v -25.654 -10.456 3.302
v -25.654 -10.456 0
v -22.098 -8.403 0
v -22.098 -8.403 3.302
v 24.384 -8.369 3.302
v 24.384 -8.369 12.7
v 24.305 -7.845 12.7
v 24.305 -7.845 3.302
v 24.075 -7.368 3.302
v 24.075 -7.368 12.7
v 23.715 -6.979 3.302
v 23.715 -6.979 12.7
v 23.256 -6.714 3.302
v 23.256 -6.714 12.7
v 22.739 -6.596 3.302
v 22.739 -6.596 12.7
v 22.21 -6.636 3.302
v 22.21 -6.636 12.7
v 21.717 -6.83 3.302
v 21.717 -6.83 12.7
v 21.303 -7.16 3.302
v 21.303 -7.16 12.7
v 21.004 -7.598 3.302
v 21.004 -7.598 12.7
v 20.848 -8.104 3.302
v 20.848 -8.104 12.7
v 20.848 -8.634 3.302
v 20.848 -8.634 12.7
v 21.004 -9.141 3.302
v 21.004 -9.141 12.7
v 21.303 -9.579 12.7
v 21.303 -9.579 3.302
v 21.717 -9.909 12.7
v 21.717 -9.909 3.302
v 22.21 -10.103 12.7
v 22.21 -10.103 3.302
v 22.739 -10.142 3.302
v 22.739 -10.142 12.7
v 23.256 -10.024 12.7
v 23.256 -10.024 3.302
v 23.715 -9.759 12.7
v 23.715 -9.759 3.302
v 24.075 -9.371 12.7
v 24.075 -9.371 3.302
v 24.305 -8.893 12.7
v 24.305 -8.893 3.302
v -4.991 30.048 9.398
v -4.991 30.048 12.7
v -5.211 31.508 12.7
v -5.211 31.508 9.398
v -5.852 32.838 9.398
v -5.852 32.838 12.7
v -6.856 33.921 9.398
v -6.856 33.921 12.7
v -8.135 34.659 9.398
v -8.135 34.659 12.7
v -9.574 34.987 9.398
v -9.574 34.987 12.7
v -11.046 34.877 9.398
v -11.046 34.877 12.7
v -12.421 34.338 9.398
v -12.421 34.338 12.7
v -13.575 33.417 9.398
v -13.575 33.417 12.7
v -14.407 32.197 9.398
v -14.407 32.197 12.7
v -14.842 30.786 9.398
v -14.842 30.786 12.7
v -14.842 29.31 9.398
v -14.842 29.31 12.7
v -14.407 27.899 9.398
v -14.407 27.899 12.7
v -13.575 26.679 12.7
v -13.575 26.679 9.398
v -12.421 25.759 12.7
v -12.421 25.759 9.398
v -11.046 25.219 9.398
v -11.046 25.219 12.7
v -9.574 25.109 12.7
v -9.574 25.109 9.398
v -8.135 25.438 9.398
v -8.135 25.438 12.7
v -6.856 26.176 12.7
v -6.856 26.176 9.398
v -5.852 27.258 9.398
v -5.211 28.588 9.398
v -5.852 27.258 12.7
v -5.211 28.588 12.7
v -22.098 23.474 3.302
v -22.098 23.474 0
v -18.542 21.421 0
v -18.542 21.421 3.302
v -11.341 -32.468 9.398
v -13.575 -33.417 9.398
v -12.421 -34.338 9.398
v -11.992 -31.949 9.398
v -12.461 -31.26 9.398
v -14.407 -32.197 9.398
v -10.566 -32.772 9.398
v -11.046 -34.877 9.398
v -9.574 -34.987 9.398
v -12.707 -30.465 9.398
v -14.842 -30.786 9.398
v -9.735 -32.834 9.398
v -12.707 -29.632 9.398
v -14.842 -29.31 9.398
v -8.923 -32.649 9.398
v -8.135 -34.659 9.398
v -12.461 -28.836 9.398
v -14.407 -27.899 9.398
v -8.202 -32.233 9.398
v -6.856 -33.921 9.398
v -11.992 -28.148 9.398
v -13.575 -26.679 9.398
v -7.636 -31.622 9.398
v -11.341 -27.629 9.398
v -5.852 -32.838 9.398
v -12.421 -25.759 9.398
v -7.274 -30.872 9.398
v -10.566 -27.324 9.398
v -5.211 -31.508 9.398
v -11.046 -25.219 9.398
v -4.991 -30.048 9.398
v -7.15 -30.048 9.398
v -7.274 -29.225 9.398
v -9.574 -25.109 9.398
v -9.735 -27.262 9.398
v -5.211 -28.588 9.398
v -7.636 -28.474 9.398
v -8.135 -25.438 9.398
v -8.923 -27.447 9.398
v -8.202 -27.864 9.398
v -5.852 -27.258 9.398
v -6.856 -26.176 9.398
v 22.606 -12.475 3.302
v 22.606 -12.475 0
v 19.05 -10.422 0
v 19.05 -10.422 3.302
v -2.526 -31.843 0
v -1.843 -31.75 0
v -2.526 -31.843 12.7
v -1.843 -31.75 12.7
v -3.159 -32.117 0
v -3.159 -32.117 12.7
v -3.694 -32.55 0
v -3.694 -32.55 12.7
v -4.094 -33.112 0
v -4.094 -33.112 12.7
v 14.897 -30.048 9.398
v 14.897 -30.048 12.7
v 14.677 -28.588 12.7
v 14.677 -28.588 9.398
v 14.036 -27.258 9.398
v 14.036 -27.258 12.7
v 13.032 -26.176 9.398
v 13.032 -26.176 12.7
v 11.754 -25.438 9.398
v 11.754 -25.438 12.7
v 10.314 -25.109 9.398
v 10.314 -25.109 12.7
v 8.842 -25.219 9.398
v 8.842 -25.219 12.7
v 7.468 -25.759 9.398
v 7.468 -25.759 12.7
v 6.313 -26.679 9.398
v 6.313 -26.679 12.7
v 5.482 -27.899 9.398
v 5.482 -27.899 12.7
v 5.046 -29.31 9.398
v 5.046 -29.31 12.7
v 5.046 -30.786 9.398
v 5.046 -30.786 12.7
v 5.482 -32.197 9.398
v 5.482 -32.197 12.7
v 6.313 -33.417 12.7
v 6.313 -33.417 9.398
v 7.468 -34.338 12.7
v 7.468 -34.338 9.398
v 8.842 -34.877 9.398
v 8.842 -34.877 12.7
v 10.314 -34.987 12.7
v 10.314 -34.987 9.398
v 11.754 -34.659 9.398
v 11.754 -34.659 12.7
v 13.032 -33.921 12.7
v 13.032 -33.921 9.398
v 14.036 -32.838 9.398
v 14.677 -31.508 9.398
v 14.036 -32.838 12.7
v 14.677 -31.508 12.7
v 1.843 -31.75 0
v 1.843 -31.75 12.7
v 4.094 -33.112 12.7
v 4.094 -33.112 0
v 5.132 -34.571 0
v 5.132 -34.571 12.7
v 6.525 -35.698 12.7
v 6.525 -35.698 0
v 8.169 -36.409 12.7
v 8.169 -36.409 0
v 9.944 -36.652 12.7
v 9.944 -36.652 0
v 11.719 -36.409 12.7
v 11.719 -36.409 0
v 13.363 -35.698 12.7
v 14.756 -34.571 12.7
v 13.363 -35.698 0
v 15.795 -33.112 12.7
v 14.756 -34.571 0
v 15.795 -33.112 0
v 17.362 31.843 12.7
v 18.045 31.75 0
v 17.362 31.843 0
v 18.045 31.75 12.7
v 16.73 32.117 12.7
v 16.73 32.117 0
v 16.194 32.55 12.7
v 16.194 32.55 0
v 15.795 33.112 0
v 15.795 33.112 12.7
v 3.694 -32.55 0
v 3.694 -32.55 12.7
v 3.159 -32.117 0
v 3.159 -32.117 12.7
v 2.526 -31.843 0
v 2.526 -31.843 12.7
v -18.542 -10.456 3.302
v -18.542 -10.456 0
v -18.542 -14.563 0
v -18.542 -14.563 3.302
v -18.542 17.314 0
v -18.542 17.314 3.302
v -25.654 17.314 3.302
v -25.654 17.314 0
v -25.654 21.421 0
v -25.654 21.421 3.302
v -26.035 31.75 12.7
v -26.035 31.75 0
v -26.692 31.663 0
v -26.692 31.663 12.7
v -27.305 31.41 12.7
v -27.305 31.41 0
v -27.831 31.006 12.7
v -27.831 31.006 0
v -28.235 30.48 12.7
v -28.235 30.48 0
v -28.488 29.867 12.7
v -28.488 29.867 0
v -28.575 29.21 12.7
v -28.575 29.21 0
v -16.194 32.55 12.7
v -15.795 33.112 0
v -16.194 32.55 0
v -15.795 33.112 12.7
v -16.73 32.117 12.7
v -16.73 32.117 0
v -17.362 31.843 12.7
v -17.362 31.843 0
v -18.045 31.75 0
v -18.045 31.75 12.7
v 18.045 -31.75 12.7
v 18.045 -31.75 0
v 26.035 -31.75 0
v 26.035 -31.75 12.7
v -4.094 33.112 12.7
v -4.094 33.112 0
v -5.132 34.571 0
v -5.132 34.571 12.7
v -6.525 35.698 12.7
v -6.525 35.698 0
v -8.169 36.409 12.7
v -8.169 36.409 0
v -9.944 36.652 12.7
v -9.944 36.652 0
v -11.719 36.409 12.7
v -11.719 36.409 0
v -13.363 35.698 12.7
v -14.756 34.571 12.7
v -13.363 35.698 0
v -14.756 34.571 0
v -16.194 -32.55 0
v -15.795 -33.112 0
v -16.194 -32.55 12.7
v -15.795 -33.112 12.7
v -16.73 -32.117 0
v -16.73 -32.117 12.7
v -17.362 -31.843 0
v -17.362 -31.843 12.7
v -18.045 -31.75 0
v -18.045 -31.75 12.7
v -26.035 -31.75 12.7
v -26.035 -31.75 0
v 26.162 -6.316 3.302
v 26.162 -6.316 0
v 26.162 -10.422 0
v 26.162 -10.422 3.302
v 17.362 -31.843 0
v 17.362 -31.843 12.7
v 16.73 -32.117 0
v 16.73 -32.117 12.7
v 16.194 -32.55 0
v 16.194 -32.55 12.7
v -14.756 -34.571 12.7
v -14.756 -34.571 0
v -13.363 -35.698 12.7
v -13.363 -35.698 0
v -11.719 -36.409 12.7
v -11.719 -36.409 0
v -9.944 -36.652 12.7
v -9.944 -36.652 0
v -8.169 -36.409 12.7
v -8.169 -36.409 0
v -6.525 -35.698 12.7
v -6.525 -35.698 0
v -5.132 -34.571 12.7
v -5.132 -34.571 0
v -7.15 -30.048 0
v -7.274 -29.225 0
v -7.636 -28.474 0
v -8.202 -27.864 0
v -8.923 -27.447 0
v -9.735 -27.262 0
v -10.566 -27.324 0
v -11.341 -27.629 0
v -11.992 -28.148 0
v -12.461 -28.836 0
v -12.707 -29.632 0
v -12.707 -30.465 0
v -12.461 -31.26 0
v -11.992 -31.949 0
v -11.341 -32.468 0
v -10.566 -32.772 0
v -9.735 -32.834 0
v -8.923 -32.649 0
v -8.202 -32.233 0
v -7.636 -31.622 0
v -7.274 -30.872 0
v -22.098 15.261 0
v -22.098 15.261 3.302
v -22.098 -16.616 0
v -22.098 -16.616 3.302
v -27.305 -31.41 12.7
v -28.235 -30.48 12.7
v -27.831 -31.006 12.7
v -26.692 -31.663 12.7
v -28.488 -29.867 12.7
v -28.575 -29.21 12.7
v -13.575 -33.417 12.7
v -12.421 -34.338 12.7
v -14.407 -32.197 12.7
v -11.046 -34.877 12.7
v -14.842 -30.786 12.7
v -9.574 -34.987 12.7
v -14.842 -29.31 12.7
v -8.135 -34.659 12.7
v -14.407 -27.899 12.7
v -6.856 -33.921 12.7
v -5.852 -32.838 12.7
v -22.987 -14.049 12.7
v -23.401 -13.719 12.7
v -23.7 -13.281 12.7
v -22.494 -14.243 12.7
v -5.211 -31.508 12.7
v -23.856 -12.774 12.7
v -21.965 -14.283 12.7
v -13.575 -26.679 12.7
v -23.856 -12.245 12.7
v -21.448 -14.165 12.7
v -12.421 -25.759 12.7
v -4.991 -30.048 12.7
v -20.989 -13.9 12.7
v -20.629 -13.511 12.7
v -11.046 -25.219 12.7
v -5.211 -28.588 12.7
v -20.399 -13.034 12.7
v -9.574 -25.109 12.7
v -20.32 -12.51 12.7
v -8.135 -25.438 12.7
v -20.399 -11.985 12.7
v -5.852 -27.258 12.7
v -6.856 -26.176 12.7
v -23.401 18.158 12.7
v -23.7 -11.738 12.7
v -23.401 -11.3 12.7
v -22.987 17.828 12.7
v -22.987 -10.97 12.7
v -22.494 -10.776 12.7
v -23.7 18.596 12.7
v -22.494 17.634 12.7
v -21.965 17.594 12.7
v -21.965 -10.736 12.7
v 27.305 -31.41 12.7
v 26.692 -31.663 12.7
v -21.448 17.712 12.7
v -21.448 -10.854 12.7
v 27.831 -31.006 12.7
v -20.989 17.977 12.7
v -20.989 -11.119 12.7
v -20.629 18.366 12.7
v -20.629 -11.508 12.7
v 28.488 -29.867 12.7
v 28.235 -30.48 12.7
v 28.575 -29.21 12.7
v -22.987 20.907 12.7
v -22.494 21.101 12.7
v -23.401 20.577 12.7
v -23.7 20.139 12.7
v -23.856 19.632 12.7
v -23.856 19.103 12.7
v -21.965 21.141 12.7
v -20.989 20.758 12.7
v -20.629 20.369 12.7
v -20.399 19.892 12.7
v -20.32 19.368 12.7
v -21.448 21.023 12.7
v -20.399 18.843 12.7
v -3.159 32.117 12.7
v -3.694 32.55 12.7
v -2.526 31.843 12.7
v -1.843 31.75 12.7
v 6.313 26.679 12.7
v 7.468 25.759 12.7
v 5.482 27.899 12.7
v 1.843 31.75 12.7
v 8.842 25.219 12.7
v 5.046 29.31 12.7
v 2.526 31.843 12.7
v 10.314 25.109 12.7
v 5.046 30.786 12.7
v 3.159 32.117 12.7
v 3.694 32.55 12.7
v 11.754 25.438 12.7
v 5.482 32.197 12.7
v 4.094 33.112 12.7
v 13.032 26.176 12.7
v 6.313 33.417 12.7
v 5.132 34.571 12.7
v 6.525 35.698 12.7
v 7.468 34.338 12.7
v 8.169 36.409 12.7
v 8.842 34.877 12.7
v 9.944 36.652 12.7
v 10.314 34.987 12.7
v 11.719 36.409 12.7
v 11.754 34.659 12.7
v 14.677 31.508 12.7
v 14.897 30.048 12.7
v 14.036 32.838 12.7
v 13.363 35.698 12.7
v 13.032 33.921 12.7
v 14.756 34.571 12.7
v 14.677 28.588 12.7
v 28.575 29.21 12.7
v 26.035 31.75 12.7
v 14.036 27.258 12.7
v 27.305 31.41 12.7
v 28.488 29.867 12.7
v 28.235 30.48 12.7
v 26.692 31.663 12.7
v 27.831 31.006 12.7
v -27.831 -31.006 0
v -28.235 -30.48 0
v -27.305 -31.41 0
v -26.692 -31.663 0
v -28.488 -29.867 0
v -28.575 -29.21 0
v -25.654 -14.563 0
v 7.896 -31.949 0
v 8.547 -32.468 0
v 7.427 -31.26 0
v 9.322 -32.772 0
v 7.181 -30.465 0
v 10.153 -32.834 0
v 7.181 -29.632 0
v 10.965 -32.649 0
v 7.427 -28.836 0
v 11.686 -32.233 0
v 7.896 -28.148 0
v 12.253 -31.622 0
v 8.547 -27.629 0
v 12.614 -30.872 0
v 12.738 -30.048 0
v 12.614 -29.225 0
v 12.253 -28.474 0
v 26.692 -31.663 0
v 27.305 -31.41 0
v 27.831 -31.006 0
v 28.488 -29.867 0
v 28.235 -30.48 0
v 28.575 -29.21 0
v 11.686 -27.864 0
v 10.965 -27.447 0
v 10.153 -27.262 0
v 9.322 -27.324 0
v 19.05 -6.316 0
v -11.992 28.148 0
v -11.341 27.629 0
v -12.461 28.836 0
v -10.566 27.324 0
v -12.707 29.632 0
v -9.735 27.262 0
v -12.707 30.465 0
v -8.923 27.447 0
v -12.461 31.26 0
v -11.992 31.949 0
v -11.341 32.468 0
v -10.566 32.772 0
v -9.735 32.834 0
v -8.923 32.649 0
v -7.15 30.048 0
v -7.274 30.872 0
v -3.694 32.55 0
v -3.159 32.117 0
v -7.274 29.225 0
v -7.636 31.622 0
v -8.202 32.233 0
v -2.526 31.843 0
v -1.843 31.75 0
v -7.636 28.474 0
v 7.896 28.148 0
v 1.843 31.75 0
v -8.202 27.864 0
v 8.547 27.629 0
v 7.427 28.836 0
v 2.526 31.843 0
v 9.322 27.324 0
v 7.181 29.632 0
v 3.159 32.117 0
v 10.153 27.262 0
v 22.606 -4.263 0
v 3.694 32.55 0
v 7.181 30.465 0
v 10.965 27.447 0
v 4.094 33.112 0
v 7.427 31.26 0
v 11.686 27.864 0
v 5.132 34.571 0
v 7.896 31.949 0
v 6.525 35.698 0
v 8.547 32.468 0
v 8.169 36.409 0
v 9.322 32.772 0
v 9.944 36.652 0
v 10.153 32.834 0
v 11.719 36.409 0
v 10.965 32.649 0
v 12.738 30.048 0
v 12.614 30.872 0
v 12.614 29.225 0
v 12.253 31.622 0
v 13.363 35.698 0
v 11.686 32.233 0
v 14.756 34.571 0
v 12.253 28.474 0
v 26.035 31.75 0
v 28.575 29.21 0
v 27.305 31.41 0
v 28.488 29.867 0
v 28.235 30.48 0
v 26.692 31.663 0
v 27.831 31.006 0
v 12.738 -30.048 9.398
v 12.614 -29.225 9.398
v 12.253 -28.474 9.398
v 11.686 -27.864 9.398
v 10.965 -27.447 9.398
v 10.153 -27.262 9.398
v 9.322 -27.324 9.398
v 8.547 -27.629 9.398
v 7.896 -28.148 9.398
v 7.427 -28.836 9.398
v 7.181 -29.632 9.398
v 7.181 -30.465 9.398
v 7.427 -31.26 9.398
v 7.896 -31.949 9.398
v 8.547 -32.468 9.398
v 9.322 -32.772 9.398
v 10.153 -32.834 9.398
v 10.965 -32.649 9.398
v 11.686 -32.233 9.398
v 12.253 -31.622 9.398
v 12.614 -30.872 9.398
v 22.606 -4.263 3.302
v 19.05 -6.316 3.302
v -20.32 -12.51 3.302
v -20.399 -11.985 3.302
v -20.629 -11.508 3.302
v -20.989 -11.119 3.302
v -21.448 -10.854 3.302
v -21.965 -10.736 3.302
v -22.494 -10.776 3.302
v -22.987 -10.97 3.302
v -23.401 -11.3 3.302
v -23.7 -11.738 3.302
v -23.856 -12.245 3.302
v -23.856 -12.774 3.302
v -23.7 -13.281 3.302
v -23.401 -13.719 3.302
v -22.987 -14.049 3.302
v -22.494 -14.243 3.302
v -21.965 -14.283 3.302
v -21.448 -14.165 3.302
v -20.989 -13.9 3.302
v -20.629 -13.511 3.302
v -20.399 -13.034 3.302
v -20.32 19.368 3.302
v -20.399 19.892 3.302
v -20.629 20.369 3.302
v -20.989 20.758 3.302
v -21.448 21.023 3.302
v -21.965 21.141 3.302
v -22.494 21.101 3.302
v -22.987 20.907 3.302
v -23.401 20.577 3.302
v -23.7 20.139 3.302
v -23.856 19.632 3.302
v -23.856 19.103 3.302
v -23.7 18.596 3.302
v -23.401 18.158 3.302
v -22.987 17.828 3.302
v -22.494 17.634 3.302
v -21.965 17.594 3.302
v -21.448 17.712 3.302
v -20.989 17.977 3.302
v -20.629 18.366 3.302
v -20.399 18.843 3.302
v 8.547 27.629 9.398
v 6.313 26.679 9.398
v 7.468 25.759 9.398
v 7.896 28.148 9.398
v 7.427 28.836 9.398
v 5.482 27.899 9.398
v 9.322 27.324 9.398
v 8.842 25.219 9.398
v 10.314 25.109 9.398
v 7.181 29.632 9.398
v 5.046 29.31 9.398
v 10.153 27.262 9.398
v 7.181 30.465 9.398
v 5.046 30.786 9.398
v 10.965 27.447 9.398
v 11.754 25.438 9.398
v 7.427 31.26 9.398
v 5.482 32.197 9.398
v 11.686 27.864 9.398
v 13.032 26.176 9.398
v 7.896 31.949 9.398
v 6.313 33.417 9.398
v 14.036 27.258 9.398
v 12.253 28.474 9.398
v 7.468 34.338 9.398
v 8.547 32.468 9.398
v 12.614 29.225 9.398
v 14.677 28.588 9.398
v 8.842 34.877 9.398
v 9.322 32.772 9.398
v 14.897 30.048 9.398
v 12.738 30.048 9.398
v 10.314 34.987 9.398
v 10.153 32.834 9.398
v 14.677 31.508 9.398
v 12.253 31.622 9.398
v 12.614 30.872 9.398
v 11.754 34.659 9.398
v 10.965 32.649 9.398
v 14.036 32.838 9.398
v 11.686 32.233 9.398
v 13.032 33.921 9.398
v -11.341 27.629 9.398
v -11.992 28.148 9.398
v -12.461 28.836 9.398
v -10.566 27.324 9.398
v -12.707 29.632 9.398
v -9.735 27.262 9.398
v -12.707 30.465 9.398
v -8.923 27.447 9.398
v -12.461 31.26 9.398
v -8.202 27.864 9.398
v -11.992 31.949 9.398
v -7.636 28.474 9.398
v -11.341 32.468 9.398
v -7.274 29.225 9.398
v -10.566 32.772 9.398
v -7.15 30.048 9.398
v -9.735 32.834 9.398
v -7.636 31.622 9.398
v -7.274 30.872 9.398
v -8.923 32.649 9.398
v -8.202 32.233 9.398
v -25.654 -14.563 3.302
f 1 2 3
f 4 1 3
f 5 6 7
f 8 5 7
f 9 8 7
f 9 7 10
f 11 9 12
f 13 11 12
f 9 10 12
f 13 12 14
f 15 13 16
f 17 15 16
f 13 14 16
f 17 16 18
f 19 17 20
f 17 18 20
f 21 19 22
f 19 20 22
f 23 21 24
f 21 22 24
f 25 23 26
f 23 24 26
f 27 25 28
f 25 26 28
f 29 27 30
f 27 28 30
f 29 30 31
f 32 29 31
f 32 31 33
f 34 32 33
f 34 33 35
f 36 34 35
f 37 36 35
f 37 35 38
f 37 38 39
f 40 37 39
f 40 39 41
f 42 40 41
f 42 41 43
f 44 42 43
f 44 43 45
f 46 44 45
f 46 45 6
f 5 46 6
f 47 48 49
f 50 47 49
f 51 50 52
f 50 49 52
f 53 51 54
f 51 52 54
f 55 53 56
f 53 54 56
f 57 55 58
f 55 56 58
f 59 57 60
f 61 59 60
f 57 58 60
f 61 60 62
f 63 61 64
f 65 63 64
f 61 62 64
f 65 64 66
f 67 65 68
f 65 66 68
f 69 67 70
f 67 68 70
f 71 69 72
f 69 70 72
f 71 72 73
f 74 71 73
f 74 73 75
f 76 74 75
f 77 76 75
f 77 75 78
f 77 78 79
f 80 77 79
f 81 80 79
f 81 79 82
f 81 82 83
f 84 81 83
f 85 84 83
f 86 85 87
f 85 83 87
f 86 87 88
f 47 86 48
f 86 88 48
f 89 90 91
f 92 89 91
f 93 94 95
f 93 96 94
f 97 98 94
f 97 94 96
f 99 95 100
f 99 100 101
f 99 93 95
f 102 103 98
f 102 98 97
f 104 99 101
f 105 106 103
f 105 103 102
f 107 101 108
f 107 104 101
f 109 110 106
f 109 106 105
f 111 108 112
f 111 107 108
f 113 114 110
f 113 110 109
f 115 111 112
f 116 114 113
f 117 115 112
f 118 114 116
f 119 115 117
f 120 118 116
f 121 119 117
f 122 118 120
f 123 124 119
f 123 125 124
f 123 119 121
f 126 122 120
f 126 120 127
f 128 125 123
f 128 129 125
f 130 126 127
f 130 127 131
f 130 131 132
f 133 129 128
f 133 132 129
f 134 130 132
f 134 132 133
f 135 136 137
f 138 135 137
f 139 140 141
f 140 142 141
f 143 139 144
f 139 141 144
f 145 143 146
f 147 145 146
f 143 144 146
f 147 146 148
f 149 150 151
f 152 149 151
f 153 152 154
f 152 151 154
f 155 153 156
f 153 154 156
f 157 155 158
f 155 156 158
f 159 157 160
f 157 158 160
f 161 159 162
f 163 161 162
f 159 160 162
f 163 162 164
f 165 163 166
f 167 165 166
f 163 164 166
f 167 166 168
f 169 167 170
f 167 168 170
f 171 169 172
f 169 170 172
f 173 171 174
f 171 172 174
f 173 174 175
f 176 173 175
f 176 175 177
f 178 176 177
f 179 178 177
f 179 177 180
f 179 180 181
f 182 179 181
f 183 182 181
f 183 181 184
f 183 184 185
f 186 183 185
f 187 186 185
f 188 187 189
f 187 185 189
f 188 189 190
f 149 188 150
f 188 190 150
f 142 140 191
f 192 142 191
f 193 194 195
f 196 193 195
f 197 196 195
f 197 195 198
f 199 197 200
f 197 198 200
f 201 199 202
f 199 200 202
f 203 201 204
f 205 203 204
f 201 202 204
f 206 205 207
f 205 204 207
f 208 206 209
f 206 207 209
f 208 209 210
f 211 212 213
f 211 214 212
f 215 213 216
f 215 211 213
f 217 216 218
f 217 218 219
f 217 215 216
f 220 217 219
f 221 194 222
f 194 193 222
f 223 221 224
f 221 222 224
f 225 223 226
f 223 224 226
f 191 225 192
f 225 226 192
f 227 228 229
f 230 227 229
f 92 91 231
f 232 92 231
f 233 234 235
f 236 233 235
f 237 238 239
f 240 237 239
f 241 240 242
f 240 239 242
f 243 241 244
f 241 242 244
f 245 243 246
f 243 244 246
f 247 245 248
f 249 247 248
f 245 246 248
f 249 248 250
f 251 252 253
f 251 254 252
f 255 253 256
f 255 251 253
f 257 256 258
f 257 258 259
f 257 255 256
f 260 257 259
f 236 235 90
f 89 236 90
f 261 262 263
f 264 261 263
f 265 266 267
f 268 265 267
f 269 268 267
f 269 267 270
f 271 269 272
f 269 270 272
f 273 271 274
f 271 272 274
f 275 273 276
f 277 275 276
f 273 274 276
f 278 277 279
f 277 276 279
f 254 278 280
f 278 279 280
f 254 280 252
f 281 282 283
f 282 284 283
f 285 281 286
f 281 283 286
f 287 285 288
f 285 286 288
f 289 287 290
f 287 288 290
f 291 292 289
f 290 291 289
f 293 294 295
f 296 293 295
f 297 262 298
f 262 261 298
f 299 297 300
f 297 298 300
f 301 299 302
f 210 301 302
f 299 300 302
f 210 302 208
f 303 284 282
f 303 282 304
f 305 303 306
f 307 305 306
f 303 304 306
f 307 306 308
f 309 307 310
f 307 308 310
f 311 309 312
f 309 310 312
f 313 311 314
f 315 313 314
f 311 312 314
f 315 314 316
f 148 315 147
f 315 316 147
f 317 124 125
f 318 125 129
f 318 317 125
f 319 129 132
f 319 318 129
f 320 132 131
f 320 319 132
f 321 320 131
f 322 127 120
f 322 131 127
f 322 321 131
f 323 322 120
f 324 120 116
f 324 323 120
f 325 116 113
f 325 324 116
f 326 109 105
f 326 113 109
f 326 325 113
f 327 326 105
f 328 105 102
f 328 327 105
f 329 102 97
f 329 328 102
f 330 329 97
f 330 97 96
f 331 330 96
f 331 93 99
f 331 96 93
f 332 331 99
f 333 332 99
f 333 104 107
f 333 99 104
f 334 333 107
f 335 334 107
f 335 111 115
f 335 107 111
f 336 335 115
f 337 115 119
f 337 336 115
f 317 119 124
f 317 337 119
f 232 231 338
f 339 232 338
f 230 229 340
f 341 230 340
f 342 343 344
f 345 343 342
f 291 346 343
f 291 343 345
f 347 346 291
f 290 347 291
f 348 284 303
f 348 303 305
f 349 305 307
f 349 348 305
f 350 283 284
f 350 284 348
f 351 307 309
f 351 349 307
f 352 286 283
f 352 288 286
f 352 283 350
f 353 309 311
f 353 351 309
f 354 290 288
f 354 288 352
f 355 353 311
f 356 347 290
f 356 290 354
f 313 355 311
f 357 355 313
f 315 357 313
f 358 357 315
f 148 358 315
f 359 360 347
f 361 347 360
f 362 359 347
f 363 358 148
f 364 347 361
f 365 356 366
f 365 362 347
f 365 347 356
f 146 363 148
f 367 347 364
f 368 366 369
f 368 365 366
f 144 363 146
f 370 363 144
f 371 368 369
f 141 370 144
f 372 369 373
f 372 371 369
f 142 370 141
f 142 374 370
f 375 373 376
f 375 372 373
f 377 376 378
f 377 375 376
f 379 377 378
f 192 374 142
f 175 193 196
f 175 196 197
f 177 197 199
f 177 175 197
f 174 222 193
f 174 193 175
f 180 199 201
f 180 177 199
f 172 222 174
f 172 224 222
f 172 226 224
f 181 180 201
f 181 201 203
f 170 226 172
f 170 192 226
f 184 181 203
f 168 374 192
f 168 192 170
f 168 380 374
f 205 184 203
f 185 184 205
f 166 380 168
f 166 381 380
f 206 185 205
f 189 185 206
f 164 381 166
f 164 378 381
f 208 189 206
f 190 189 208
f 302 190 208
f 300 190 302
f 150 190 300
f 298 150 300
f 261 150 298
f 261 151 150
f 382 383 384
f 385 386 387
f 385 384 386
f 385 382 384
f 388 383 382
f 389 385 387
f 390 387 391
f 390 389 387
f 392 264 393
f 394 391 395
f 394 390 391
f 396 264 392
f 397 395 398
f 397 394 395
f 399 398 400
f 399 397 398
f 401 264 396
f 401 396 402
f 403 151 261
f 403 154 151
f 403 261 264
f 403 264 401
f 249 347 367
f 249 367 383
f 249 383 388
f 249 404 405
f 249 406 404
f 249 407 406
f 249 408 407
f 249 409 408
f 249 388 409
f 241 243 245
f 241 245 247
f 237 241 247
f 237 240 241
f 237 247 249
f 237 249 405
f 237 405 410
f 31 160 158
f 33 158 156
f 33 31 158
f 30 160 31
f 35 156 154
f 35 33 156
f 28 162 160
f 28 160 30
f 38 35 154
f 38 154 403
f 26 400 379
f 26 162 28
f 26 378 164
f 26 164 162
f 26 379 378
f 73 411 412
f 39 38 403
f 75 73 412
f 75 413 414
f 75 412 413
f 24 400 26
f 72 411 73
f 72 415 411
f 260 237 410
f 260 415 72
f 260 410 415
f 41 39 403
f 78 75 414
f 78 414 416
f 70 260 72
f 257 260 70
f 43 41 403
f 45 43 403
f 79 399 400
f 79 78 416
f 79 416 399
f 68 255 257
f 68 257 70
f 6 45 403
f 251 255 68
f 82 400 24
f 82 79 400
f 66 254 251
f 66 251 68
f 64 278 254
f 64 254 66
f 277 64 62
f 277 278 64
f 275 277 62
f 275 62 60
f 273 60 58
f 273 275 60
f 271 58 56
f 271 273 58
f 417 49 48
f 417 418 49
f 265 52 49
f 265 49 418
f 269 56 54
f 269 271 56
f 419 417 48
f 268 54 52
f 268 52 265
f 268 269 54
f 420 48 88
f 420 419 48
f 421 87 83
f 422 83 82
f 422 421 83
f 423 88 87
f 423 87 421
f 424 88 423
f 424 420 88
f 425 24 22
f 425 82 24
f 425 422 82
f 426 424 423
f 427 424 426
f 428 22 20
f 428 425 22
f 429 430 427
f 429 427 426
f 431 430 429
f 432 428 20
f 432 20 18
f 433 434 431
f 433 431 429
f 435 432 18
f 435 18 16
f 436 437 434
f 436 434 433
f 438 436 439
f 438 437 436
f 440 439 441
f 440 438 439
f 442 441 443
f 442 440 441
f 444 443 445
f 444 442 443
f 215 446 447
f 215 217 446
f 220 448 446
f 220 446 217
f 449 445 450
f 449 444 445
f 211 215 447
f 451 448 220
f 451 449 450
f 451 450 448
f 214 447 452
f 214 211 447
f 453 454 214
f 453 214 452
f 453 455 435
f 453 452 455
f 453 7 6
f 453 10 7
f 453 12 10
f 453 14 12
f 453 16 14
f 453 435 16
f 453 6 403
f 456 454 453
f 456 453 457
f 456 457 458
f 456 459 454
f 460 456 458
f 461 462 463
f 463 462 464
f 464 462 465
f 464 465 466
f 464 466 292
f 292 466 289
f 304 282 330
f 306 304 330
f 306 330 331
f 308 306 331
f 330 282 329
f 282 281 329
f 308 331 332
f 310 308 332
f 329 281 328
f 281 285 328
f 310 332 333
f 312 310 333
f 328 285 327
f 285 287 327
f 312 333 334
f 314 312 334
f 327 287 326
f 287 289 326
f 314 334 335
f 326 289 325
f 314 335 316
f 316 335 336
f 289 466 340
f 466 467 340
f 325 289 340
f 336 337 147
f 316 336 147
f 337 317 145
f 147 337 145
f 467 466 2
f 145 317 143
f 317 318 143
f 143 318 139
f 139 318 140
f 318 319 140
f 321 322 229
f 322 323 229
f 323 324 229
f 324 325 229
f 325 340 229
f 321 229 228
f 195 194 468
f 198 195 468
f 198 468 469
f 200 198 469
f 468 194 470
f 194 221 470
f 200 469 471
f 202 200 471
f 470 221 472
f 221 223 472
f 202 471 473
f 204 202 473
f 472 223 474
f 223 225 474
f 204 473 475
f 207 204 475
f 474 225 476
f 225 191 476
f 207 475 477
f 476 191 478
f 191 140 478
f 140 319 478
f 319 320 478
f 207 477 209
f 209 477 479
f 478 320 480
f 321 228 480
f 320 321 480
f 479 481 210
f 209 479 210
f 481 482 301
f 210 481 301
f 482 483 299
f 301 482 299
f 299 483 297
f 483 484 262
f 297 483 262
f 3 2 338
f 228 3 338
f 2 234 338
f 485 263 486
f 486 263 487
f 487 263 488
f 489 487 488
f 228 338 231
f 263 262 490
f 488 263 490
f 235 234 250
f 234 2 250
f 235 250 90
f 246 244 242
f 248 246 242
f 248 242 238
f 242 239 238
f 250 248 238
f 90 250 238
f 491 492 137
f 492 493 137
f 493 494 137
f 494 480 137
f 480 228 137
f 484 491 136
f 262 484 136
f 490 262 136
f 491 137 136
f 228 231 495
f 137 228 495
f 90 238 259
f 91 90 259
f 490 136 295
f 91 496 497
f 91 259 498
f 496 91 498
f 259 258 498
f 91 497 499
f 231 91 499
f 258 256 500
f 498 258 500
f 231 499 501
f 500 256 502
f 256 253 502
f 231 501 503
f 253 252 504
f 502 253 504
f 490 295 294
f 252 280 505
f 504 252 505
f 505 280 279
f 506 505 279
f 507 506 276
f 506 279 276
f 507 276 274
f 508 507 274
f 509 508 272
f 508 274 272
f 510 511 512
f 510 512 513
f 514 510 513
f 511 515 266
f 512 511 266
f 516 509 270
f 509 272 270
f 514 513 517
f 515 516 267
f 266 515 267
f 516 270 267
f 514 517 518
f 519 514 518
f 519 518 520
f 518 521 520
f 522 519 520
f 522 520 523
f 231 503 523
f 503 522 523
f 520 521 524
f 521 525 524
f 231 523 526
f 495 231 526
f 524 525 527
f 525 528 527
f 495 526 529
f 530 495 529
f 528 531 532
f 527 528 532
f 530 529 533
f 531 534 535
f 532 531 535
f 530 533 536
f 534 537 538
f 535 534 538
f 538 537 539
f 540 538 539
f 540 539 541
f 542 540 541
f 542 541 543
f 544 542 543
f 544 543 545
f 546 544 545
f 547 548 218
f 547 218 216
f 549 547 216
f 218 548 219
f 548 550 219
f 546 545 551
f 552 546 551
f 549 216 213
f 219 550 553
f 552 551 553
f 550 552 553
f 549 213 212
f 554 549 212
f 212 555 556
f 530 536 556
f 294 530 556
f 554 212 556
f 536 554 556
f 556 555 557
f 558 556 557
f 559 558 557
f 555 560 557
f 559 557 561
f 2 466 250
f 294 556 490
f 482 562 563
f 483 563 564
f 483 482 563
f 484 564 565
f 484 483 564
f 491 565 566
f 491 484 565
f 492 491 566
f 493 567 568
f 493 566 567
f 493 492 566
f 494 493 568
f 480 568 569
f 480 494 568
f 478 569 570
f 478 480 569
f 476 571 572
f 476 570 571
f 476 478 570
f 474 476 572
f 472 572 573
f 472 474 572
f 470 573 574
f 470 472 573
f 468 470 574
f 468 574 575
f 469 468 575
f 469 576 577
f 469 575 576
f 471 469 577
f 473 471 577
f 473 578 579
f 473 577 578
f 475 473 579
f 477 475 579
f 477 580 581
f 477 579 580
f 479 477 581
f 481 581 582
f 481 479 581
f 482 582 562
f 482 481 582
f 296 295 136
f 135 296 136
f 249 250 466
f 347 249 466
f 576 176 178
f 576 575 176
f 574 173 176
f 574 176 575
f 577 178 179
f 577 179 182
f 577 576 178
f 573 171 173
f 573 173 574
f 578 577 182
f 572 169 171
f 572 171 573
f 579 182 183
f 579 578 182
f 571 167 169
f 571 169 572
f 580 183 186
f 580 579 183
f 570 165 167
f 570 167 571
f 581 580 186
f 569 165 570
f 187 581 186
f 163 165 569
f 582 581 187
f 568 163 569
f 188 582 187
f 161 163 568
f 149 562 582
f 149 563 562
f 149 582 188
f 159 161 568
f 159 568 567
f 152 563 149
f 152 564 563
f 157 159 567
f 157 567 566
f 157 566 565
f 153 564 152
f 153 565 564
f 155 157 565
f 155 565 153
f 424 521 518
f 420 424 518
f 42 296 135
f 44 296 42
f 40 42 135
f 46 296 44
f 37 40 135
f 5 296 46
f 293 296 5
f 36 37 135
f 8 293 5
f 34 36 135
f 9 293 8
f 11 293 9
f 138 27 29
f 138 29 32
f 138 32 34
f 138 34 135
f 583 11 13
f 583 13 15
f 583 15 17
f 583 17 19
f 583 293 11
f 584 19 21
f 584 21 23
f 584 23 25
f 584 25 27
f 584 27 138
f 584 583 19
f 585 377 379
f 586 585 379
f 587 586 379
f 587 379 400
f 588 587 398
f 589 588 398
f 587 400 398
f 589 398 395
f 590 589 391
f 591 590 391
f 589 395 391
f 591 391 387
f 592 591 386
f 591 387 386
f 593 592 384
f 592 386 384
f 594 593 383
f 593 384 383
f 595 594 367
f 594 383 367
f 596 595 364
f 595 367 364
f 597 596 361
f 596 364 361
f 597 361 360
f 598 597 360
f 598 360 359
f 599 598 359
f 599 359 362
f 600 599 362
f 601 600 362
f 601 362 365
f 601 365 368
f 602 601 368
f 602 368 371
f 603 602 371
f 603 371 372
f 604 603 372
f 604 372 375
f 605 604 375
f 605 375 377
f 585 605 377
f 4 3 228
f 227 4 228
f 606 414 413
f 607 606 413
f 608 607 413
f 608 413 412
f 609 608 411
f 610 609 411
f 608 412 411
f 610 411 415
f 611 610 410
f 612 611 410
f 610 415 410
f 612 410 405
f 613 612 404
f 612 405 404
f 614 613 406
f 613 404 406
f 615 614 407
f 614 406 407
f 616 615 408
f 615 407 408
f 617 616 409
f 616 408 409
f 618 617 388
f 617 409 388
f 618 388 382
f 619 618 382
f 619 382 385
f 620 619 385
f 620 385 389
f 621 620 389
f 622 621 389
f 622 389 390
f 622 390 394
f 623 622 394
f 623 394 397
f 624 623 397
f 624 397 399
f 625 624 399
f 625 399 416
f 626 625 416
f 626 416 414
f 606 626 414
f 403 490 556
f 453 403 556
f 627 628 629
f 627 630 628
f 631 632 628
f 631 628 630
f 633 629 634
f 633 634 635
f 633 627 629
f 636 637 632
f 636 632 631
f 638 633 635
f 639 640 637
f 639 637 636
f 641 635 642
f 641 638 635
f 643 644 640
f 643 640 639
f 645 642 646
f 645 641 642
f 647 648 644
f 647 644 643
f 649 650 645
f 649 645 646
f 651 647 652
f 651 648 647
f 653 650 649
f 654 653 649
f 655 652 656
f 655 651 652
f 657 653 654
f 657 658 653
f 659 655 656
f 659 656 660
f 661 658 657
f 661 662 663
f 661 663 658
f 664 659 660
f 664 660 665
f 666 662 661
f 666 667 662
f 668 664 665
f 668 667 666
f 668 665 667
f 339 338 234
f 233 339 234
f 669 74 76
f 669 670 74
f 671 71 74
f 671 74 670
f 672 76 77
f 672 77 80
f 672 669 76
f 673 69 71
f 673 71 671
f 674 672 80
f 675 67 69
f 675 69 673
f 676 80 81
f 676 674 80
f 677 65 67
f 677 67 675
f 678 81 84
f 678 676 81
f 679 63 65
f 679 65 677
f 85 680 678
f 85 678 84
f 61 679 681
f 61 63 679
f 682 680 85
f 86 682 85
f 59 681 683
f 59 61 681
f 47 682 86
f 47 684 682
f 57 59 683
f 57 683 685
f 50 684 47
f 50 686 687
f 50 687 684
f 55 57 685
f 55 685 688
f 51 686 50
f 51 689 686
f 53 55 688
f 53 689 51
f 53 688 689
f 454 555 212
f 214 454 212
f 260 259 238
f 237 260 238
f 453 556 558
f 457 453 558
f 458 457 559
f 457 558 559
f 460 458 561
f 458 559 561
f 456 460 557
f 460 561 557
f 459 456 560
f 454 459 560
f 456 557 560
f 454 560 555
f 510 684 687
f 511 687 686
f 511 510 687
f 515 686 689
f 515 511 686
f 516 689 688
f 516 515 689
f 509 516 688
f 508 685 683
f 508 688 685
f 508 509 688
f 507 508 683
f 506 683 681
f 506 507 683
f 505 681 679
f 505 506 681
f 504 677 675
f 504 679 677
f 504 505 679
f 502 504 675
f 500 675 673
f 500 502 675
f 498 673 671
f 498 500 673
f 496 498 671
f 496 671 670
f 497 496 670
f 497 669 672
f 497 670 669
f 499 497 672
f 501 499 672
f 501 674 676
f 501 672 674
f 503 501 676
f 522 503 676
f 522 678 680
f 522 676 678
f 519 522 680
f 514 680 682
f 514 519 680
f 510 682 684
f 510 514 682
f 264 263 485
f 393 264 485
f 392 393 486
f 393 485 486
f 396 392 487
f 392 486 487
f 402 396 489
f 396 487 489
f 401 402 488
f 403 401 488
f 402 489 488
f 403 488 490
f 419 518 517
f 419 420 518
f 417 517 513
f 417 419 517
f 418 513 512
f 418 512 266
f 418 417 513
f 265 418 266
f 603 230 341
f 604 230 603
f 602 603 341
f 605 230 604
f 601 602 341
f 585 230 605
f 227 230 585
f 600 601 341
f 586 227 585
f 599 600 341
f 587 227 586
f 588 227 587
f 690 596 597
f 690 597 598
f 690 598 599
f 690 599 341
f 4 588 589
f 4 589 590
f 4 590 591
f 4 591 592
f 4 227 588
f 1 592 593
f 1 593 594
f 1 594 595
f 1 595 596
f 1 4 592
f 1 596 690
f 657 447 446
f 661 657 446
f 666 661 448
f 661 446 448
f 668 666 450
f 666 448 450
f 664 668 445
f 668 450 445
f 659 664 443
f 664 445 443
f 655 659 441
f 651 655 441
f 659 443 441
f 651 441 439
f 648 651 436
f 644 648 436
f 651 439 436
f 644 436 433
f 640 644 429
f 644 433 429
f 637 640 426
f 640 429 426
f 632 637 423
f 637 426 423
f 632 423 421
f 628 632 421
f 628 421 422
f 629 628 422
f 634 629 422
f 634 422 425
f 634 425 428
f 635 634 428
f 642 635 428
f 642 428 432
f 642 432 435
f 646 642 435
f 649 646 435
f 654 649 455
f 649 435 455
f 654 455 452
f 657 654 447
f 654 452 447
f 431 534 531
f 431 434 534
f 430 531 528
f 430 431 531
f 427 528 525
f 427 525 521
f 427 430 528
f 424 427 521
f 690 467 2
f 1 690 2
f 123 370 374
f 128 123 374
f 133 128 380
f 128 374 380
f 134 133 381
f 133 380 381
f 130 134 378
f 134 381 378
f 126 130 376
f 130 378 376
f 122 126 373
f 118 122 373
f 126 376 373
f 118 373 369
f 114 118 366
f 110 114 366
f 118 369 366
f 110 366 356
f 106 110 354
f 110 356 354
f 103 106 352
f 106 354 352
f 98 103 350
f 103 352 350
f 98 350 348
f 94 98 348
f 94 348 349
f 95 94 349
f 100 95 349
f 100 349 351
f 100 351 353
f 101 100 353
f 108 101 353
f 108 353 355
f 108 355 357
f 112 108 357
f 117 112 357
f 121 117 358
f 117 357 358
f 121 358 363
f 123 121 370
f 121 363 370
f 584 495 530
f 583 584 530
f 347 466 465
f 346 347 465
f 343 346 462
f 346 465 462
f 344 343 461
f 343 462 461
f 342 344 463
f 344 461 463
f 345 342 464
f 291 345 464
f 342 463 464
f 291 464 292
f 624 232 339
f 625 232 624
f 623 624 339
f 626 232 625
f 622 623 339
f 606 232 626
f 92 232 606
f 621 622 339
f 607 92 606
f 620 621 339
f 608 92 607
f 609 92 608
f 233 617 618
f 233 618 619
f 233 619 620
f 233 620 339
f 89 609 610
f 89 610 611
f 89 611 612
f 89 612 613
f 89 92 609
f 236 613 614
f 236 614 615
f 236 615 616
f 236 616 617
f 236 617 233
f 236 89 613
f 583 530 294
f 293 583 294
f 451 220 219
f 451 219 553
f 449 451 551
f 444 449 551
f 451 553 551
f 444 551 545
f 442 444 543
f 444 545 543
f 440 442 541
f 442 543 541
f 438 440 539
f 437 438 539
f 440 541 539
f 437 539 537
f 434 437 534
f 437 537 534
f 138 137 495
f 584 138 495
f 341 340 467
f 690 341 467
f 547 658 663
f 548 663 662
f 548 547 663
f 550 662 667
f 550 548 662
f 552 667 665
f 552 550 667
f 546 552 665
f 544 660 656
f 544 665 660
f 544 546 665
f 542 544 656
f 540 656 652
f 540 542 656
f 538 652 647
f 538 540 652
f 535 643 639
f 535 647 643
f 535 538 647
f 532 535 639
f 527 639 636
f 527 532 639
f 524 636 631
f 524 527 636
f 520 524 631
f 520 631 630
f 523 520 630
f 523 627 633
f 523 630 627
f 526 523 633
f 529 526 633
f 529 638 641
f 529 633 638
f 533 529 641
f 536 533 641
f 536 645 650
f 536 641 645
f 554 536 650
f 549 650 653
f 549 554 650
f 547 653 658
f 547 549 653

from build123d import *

# Parameters (mm, degrees)
SKETCH1_R           = 2.794
BOSS_EXTRUDE1_DEPTH = 12.7
SKETCH2_R           = 1.778
CUT_EXTRUDE1_DEPTH  = 49.178879085
SKETCH4_R           = 4.953
CUT_EXTRUDE3_DEPTH  = 3.302
FILLET1_R           = 2.54
CUT_EXTRUDE4_DEPTH  = 3.302


with BuildPart() as part:
    # Sketch1 → Boss-Extrude1 (new body)
    with BuildSketch(Plane.XY):
        with BuildLine():
            ThreePointArc((28.575, 29.21), (27.831051224, 31.006051224), (26.035, 31.75))
            Line((26.035, 31.75), (16.32506331, 31.75))
            ThreePointArc((16.32506331, 31.75), (9.9441, 36.6522), (3.56313669, 31.75))
            Line((3.56313669, 31.75), (-3.56313669, 31.75))
            ThreePointArc((-3.56313669, 31.75), (-9.9441, 36.6522), (-16.32506331, 31.75))
            Line((-16.32506331, 31.75), (-26.035, 31.75))
            ThreePointArc((-26.035, 31.75), (-27.831051224, 31.006051224), (-28.575, 29.21))
            Line((-28.575, 29.21), (-28.575, -29.21))
            ThreePointArc((-28.575, -29.21), (-27.831051224, -31.006051224), (-26.035, -31.75))
            Line((-26.035, -31.75), (-16.32506331, -31.75))
            ThreePointArc((-16.32506331, -31.75), (-9.9441, -36.6522), (-3.56313669, -31.75))
            Line((-3.56313669, -31.75), (3.56313669, -31.75))
            ThreePointArc((3.56313669, -31.75), (9.9441, -36.6522), (16.32506331, -31.75))
            Line((16.32506331, -31.75), (26.035, -31.75))
            ThreePointArc((26.035, -31.75), (27.831051224, -31.006051224), (28.575, -29.21))
            Line((28.575, -29.21), (28.575, 29.21))
        make_face()
        with Locations((-9.9441, 30.0482)):
            Circle(SKETCH1_R, mode=Mode.SUBTRACT)
        with Locations((9.9441, 30.0482)):
            Circle(SKETCH1_R, mode=Mode.SUBTRACT)
        with Locations((9.9441, -30.0482)):
            Circle(SKETCH1_R, mode=Mode.SUBTRACT)
        with Locations((-9.9441, -30.0482)):
            Circle(SKETCH1_R, mode=Mode.SUBTRACT)
    extrude(amount=BOSS_EXTRUDE1_DEPTH)

    # Sketch2 → Cut-Extrude1 (cut, through all)
    with BuildSketch(Plane.XY.offset(12.7)):
        with Locations((-22.098, 19.3675)):
            Circle(SKETCH2_R)
        with Locations((-22.098, -12.5095)):
            Circle(SKETCH2_R)
        with Locations((22.606, -8.3693)):
            Circle(SKETCH2_R)
    extrude(amount=-CUT_EXTRUDE1_DEPTH, mode=Mode.SUBTRACT)

    # Sketch4 → Cut-Extrude3 (cut)
    with BuildSketch(Plane.XY.offset(12.7)):
        with Locations((-9.9441, 30.0482)):
            Circle(SKETCH4_R)
        with Locations((9.9441, 30.0482)):
            Circle(SKETCH4_R)
        with Locations((-9.9441, -30.0482)):
            Circle(SKETCH4_R)
        with Locations((9.9441, -30.0482)):
            Circle(SKETCH4_R)
    extrude(amount=-CUT_EXTRUDE3_DEPTH, mode=Mode.SUBTRACT)

    # Fillet1
    fillet1_edges = [part.edges().sort_by_distance(p)[0] for p in [
        (16.32506331, 31.75, 6.35),
        (16.32506331, -31.75, 6.35),
        (3.56313669, -31.75, 6.35),
        (-3.56313669, -31.75, 6.35),
        (-16.32506331, -31.75, 6.35),
        (-16.32506331, 31.75, 6.35),
        (-3.56313669, 31.75, 6.35),
        (3.56313669, 31.75, 6.35),
    ]]
    fillet(fillet1_edges, radius=FILLET1_R)

    # Sketch3 → Cut-Extrude4 (cut)
    with BuildSketch(Plane(origin=(0, 0, 0), x_dir=(-1, 0, 0), z_dir=(0, 0, -1))):
        Polygon((-22.606, -12.475415114), (-19.05, -10.422357557), (-19.05, -6.316242443), (-22.606, -4.263184886), (-26.162, -6.316242443), (-26.162, -10.422357557), align=None)
        Polygon((22.098, -16.615615114), (25.654, -14.562557557), (25.654, -10.456442443), (22.098, -8.403384886), (18.542, -10.456442443), (18.542, -14.562557557), align=None)
        Polygon((22.098, 15.261384886), (25.654, 17.314442443), (25.654, 21.420557557), (22.098, 23.473615114), (18.542, 21.420557557), (18.542, 17.314442443), align=None)
    extrude(amount=-CUT_EXTRUDE4_DEPTH, mode=Mode.SUBTRACT)


solid = part.part
